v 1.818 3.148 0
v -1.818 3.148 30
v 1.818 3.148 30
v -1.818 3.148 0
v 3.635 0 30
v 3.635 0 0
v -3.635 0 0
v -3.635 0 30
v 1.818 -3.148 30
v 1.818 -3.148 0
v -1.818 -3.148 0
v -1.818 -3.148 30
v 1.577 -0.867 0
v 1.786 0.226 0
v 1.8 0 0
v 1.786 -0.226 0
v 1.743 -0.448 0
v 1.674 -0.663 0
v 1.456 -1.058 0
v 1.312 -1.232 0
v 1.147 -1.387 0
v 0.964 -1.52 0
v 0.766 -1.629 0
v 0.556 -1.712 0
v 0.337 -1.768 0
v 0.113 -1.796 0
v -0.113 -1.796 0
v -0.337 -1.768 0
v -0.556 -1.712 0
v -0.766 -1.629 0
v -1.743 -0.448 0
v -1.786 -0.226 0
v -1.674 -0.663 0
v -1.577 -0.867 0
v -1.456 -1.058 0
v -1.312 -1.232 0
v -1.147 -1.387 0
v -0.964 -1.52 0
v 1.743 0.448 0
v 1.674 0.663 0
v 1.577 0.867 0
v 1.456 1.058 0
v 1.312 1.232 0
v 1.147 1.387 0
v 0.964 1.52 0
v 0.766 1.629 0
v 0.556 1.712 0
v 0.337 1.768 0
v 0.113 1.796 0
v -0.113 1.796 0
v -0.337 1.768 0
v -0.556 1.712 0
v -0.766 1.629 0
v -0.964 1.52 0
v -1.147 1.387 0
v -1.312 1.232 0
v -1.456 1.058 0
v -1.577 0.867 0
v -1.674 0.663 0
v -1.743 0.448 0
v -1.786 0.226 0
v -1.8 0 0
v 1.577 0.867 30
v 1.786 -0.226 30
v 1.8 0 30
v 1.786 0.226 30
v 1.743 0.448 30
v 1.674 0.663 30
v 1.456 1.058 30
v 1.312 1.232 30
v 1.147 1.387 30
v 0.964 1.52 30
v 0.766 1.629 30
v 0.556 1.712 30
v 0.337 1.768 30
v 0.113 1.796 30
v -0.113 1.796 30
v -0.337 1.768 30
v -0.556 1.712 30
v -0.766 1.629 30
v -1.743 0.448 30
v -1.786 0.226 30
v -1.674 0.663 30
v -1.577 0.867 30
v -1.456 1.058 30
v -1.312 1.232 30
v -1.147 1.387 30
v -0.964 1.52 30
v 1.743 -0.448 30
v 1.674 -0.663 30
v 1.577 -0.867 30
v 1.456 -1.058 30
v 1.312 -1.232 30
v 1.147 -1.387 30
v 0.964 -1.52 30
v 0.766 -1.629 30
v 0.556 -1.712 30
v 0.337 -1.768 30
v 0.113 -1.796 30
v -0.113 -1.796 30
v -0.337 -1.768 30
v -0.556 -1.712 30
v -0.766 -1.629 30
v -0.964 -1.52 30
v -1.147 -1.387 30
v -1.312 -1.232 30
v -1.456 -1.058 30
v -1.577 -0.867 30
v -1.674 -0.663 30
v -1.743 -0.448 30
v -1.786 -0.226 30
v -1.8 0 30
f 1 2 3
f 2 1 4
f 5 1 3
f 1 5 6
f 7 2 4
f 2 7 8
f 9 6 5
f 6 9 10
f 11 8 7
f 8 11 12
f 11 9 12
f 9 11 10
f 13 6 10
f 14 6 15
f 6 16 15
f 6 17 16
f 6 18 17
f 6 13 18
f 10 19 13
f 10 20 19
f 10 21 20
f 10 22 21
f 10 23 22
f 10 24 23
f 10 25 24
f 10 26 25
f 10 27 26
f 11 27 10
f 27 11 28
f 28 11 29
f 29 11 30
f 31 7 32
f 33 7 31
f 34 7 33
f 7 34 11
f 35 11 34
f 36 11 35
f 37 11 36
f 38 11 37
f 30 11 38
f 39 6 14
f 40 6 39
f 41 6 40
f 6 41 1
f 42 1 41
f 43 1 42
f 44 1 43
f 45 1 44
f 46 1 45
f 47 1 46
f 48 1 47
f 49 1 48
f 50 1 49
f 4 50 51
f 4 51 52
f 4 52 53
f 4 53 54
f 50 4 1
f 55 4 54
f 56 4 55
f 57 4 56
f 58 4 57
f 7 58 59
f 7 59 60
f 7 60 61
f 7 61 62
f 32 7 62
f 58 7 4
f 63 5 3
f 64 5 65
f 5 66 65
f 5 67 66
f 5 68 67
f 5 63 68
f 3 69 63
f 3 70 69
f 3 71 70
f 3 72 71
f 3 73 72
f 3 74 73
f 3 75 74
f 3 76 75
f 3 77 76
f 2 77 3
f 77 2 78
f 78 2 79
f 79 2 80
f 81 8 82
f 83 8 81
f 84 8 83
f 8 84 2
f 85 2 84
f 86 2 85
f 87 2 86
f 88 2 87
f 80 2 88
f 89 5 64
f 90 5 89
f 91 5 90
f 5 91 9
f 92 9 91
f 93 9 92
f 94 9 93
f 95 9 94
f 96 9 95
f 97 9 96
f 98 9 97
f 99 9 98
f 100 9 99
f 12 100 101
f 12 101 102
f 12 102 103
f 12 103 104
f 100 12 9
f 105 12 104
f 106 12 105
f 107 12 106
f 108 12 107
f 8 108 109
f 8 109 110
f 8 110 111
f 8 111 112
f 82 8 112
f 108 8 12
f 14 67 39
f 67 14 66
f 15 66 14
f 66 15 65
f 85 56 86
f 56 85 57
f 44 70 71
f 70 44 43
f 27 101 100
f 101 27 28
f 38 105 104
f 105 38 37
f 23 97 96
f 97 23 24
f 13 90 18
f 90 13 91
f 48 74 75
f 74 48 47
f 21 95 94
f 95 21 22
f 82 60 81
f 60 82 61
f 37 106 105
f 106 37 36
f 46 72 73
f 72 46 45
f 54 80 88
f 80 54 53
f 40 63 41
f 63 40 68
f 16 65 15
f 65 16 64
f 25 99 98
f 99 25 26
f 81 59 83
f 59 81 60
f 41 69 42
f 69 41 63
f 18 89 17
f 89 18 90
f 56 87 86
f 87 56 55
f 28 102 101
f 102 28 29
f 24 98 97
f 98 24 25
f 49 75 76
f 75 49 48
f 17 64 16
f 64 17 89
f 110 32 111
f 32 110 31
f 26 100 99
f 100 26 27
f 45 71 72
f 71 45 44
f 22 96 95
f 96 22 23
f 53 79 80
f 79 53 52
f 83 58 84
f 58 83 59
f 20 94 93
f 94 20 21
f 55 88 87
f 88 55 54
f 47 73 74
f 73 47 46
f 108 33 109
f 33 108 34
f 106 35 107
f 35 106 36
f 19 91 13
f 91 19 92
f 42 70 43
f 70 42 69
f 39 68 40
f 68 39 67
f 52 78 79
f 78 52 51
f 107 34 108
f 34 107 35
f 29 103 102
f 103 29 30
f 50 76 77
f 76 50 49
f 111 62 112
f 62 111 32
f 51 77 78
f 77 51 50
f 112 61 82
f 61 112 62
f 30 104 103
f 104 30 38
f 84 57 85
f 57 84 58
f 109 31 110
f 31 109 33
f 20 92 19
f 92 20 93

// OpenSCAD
$fn = 50;


difference() {
	union() {
		linear_extrude(height = 30) {
			polygon(points = [[3.6351000000, 0.0000000000], [1.8175500000, 3.1480889453], [-1.8175500000, 3.1480889453], [-3.6351000000, 0.0000000000], [-1.8175500000, -3.1480889453], [1.8175500000, -3.1480889453]]);
		}
	}
	union() {
		cylinder(h = 30, r = 1.8000000000);
	}
}
